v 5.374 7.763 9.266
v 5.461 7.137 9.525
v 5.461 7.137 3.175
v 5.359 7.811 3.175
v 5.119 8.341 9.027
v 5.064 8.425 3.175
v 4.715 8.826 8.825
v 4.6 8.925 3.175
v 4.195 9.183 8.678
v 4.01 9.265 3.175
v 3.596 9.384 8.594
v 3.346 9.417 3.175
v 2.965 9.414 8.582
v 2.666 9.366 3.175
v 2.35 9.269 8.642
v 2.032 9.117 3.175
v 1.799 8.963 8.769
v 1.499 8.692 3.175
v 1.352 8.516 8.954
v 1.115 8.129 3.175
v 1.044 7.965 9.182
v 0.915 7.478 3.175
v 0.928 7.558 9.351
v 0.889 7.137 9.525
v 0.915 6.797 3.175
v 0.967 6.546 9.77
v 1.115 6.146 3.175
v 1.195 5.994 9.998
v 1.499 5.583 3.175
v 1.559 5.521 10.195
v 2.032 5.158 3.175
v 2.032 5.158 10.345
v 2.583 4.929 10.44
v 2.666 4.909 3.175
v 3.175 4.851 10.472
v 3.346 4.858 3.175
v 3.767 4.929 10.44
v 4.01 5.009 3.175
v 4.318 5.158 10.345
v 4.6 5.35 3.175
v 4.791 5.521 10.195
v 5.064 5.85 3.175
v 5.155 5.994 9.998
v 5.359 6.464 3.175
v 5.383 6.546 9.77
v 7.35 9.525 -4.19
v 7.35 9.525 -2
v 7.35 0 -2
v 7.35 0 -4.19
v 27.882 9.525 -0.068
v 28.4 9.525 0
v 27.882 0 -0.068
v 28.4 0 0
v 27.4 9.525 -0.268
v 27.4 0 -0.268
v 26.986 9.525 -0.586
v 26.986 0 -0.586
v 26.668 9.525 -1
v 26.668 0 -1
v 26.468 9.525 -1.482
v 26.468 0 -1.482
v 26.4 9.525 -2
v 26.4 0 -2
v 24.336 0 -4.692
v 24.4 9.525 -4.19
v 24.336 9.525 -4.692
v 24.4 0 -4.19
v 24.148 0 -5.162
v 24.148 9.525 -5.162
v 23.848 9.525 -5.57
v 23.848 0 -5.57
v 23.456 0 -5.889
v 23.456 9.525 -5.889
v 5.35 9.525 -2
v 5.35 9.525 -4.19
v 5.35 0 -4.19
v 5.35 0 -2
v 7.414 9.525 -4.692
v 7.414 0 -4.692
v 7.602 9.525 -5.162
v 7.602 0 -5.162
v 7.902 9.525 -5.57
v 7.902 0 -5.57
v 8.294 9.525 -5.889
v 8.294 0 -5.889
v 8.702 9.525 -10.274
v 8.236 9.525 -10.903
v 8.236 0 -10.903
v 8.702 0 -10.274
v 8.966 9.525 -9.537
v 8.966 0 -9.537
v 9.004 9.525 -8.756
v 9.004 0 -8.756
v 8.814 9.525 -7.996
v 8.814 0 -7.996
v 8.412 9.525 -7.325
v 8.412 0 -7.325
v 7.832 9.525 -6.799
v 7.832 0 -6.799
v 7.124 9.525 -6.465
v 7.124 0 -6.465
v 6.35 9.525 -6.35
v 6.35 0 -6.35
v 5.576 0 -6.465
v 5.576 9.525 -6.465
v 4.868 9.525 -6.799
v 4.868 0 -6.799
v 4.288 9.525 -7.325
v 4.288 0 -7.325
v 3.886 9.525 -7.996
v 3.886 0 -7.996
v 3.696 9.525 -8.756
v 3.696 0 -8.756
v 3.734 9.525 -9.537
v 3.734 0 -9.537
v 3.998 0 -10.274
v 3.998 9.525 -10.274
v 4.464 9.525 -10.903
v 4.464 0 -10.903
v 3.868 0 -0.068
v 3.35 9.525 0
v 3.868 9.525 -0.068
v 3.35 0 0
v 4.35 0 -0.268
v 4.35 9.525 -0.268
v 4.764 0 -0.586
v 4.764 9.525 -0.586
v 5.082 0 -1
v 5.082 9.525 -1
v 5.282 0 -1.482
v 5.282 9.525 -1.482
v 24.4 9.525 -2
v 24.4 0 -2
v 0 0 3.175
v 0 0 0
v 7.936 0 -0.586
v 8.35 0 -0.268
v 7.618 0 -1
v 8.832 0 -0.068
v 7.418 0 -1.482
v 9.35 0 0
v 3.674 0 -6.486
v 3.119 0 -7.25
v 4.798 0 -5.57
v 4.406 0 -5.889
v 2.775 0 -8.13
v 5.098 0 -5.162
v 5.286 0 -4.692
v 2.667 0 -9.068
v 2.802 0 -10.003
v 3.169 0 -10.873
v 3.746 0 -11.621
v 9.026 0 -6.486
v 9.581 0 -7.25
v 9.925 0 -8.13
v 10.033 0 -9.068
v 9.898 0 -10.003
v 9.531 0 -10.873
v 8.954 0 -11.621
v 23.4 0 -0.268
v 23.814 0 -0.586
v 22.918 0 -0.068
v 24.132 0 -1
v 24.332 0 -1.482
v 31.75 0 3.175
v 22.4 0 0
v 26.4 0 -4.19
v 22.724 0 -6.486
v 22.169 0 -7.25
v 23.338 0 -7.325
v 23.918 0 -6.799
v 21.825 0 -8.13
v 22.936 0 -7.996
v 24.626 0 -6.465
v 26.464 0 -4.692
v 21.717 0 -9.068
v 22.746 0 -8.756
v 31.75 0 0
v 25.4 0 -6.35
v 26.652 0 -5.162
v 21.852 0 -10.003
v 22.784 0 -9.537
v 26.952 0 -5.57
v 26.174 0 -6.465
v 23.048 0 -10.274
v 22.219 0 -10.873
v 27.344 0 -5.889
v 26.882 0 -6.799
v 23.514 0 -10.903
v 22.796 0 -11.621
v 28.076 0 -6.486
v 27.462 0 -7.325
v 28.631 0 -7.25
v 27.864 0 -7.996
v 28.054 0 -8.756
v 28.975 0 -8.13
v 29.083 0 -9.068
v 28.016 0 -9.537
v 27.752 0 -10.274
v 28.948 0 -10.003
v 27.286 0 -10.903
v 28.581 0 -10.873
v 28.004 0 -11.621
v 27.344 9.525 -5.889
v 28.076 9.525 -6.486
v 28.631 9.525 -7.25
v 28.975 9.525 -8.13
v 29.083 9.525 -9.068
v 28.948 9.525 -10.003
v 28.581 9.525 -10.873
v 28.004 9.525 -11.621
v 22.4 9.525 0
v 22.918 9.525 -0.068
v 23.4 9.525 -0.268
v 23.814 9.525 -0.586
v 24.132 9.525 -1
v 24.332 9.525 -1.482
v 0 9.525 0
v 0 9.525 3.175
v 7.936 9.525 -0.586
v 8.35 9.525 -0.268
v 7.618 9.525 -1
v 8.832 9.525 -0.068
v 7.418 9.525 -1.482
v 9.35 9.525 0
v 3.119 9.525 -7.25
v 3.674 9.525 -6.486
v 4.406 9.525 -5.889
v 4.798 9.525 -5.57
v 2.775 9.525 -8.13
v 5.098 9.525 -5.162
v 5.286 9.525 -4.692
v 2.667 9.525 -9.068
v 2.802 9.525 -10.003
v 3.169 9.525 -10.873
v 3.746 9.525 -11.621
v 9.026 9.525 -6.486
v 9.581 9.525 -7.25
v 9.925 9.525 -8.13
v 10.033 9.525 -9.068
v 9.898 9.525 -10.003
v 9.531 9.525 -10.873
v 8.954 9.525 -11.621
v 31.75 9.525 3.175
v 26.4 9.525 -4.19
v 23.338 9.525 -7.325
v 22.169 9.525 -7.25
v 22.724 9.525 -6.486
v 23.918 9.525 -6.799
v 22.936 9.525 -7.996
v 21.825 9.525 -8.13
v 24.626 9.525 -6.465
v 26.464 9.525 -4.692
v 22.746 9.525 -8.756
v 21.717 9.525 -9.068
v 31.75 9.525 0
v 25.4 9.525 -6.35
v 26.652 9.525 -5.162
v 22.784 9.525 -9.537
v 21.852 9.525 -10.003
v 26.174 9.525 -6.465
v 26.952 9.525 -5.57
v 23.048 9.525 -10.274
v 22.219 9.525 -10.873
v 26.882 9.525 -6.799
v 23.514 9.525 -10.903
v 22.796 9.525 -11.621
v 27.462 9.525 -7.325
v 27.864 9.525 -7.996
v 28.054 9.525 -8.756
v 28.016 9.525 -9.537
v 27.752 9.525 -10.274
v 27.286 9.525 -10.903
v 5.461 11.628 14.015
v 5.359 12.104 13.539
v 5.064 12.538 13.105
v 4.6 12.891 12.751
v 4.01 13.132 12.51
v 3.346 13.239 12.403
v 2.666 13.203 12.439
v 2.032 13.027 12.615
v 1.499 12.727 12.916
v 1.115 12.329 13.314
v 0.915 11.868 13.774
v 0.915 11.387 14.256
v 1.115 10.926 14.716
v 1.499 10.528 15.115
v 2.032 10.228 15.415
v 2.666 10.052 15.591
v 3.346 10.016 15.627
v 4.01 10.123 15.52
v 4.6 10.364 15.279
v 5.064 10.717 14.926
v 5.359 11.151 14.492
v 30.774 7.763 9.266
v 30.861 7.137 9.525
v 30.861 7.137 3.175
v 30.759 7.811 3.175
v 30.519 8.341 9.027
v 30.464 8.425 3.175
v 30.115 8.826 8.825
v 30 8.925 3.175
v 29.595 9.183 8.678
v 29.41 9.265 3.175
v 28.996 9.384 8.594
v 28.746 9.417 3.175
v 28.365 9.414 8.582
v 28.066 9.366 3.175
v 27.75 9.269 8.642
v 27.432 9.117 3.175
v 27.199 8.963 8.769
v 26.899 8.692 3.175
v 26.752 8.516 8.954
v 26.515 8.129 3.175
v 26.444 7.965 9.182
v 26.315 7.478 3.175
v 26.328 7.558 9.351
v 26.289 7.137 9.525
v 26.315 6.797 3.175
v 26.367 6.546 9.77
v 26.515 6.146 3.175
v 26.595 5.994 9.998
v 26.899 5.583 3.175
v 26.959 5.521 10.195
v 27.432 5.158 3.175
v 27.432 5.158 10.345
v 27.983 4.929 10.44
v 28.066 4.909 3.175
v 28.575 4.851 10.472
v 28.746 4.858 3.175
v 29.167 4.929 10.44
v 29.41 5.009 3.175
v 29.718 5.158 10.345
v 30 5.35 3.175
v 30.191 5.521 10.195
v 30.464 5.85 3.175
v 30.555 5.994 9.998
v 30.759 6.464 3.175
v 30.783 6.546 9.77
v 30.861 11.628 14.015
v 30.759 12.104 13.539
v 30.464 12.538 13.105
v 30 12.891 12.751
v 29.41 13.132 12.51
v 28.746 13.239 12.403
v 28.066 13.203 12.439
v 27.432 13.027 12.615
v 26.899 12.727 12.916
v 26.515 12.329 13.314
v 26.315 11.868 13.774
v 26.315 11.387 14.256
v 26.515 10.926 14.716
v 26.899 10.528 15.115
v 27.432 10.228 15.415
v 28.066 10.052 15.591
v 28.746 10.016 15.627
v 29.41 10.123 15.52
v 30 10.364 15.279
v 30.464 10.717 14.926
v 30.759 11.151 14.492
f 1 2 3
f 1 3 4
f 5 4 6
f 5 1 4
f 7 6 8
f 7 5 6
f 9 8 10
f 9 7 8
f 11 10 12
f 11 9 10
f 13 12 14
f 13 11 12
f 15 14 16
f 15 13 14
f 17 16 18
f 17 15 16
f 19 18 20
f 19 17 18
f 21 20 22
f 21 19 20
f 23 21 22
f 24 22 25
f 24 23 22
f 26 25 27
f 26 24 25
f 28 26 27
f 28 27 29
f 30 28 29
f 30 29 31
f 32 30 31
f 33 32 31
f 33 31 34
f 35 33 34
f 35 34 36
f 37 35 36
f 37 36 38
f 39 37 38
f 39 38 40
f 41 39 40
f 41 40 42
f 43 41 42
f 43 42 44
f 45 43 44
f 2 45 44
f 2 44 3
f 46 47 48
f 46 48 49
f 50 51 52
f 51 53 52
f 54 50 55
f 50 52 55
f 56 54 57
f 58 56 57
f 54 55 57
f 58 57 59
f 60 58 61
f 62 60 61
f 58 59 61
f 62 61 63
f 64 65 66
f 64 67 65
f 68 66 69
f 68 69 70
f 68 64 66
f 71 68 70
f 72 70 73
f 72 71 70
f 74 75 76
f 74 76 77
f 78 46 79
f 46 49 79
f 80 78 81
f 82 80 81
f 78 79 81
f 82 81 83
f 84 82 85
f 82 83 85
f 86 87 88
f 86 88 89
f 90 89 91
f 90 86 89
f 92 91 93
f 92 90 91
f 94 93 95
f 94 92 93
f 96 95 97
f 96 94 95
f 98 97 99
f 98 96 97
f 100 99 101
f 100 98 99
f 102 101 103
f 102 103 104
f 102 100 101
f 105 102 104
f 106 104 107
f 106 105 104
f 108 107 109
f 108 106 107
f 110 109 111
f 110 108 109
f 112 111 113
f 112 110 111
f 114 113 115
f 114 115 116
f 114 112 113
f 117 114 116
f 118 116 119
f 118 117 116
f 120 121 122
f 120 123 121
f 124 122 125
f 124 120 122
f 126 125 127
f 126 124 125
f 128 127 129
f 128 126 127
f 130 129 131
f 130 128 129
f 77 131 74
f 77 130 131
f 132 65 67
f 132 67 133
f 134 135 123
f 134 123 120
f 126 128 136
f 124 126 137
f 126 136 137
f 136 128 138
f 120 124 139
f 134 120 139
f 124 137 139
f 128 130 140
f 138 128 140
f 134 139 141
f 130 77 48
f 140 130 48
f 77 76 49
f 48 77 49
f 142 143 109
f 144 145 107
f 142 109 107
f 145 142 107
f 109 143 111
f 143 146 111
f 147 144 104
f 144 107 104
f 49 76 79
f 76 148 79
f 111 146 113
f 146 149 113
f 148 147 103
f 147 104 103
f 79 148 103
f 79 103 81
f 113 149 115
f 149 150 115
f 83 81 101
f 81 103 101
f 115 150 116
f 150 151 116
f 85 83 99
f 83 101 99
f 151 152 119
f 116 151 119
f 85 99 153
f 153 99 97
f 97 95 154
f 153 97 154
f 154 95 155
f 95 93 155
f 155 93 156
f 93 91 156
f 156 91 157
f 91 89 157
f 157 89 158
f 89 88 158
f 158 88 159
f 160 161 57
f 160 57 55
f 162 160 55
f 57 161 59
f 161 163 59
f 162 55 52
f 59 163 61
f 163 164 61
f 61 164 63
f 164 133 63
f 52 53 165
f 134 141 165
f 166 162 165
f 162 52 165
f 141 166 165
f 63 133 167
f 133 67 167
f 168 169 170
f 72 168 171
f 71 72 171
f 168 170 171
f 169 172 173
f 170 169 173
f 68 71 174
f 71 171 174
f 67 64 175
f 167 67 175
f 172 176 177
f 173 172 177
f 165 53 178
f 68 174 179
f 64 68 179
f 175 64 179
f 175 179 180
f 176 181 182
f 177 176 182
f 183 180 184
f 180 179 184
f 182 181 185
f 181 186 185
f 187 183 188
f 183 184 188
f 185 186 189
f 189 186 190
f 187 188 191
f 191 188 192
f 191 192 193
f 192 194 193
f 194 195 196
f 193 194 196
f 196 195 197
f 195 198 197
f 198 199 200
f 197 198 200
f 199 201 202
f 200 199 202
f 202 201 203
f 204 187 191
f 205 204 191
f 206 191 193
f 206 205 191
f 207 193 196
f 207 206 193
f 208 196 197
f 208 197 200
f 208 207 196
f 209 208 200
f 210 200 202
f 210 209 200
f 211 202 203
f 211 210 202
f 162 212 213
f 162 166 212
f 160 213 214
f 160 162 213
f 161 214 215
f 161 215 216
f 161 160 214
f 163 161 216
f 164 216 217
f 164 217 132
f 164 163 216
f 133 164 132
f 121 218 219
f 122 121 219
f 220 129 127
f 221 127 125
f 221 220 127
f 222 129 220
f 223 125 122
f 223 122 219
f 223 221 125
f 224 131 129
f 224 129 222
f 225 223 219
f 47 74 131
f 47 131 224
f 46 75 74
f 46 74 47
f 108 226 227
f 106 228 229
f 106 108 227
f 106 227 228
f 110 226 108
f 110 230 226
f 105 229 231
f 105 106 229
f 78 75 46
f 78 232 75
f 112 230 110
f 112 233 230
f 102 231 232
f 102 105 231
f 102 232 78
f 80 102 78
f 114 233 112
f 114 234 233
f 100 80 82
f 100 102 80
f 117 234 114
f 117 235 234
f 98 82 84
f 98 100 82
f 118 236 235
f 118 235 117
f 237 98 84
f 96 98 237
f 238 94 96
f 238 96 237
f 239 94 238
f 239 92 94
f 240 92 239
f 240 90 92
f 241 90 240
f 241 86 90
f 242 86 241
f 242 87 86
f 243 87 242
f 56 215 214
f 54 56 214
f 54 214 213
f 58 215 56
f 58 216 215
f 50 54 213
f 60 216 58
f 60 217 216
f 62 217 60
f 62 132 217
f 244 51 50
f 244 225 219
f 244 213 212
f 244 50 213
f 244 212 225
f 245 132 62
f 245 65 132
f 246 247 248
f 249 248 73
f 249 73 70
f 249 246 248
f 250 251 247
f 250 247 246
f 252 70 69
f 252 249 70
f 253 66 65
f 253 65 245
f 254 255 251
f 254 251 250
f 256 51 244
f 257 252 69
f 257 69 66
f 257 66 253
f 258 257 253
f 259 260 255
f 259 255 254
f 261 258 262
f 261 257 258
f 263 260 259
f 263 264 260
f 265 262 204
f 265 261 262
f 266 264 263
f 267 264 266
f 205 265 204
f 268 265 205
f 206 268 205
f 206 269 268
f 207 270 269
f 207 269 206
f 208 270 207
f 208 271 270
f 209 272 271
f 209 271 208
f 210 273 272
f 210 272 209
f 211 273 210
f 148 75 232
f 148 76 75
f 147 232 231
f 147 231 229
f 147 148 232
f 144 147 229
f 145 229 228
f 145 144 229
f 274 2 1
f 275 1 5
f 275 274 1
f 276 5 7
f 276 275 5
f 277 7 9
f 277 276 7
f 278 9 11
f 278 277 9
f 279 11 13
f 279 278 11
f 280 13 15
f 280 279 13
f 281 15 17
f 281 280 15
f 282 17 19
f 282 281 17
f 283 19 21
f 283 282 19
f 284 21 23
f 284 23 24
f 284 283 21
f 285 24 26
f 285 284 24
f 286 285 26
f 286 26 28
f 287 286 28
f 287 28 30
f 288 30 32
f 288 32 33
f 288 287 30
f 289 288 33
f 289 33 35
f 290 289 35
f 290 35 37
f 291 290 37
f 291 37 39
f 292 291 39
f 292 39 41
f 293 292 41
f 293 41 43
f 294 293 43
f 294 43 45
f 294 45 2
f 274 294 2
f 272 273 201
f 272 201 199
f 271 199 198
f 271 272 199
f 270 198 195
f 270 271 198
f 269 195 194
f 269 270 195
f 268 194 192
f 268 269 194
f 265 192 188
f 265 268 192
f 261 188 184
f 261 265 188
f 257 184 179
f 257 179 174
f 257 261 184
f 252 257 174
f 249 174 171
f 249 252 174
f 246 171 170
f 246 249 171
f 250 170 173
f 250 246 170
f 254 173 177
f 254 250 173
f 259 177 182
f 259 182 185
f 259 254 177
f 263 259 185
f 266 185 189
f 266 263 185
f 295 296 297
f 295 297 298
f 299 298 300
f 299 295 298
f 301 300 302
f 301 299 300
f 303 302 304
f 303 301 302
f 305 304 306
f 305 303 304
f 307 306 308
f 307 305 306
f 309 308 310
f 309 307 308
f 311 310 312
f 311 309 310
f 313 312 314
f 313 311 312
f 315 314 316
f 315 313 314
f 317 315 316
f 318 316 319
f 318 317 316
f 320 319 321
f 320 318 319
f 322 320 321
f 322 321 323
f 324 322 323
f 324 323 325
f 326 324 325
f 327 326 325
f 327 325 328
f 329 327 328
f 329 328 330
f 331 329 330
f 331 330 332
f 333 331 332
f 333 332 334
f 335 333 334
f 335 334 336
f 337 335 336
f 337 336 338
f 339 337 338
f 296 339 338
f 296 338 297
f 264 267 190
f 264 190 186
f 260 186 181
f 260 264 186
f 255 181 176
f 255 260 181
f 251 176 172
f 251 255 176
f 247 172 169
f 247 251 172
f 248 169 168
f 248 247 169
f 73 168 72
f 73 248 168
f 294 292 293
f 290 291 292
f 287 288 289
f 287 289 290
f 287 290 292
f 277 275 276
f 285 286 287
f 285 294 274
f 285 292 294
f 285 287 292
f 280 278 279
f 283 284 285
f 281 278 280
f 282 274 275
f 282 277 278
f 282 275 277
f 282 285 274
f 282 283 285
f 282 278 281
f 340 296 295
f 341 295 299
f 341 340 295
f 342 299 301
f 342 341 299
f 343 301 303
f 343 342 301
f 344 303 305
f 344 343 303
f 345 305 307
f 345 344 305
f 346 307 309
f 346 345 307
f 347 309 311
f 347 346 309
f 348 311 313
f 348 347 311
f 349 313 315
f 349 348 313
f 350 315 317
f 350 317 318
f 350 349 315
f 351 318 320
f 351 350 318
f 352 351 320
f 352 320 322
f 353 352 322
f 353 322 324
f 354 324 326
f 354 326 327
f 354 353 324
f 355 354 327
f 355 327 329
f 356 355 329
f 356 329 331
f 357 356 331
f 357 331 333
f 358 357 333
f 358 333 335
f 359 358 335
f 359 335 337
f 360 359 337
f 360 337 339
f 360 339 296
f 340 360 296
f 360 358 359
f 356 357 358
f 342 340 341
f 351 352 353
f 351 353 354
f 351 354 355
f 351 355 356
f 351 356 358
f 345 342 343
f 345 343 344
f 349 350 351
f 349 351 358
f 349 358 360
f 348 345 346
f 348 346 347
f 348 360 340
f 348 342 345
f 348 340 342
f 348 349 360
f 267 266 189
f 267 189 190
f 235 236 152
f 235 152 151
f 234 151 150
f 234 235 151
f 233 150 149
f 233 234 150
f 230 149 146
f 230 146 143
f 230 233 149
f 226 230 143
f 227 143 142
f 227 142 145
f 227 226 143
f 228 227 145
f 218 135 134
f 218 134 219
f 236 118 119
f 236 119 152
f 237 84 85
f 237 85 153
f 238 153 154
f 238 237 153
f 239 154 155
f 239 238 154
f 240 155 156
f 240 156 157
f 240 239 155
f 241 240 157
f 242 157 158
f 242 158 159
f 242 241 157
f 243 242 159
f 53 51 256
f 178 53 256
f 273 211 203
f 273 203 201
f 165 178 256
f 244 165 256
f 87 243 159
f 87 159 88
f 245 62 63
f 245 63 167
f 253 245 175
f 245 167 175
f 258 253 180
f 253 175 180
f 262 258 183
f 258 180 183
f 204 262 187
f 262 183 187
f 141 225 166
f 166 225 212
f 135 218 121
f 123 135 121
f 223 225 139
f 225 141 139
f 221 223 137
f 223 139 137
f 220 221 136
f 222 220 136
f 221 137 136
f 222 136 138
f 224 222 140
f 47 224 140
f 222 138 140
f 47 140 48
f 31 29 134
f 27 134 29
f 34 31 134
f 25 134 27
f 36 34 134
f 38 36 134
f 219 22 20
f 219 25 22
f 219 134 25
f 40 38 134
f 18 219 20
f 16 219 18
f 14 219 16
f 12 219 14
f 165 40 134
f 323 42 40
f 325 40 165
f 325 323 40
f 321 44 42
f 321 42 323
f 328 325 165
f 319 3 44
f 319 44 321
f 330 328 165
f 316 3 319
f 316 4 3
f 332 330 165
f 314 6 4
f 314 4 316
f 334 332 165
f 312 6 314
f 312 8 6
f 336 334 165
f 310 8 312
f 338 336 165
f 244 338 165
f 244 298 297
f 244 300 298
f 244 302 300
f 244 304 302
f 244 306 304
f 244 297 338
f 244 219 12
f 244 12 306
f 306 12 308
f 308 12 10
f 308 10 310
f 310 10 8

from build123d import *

# Parameters (mm, degrees)
F0_W      = 31.75
F0_H      = 9.525
F1_DEPTH  = 3.175
F4_R      = 2.286
F8_R      = 2.286
F11_DEPTH = 9.525
F12_R     = 2


with BuildPart() as f1:
    # F0 (on Top) → F1 (new body)
    with BuildSketch(Plane.XY):
        with Locations((15.875, 4.7625)):
            Rectangle(F0_W, F0_H)
    extrude(amount=F1_DEPTH)

    # F5: sweep along a path in F3
    with BuildLine(Plane.YZ.offset(28.575)) as f5_path:
        Line((7.1374, 3.175), (7.1374, 9.525))
        Line((7.1374, 9.525), (11.6275280605, 14.0151280605))
    # F4 (on face) → F5 (sweep)
    with BuildSketch(Plane.XY.offset(3.175)):
        with Locations((28.575, 7.1374)):
            Circle(F4_R)
    sweep(path=f5_path.line, transition=Transition.RIGHT)

    # F9: sweep along a path in F7
    with BuildLine(Plane.YZ.offset(3.175)) as f9_path:
        Line((7.1374, 3.175), (7.1374, 9.525))
        Line((7.1374, 9.525), (11.6275280605, 14.0151280605))
    # F8 (on face) → F9 (sweep)
    with BuildSketch(Plane.XY.offset(3.175)):
        with Locations((3.175, 7.1374)):
            Circle(F8_R)
    sweep(path=f9_path.line, transition=Transition.RIGHT)

    # F10 (on face) → F11 (join, through all)
    with BuildSketch(Plane(origin=(0, 9.525, 0), x_dir=(-1, 0, 0), z_dir=(0, 1, 0))):
        with BuildLine():
            ThreePointArc((-27.2858537854, -10.9028537854), (-25.4, -6.35), (-23.5141462146, -10.9028537854))
            Line((-23.5141462146, -10.9028537854), (-22.7957257249, -11.6212742751))
            ThreePointArc((-22.7957257249, -11.6212742751), (-21.8362951849, -8.0872166969), (-24.4, -5.4723577049))
            Line((-24.4, -5.4723577049), (-24.4, 0))
            Line((-24.4, 0), (-26.4, 0))
            Line((-26.4, 0), (-26.4, -5.4723577049))
            ThreePointArc((-26.4, -5.4723577049), (-28.9637048151, -8.0872166969), (-28.0042742751, -11.6212742751))
            Line((-28.0042742751, -11.6212742751), (-27.2858537854, -10.9028537854))
        make_face()
        with BuildLine():
            Line((-5.35, 0), (-7.35, 0))
            Line((-7.35, 0), (-7.35, -5.4723577049))
            ThreePointArc((-7.35, -5.4723577049), (-9.9137048151, -8.0872166969), (-8.9542742751, -11.6212742751))
            Line((-8.9542742751, -11.6212742751), (-8.2358537854, -10.9028537854))
            ThreePointArc((-8.2358537854, -10.9028537854), (-6.35, -6.35), (-4.4641462146, -10.9028537854))
            Line((-4.4641462146, -10.9028537854), (-3.7457257249, -11.6212742751))
            ThreePointArc((-3.7457257249, -11.6212742751), (-2.7862951849, -8.0872166969), (-5.35, -5.4723577049))
            Line((-5.35, -5.4723577049), (-5.35, 0))
        make_face()
    extrude(amount=-F11_DEPTH)

    # F12
    f12_edges = [f1.edges().sort_by_distance(p)[0] for p in [
        (26.4, 4.7625, 0),
        (24.4, 4.7625, 0),
        (7.35, 4.7625, 0),
        (5.35, 4.7625, 0),
        (24.4, 4.7625, -5.472358),
        (26.4, 4.7625, -5.472358),
        (7.35, 4.7625, -5.472358),
        (5.35, 4.7625, -5.472358),
    ]]
    fillet(f12_edges, radius=F12_R)


solid = f1.part
